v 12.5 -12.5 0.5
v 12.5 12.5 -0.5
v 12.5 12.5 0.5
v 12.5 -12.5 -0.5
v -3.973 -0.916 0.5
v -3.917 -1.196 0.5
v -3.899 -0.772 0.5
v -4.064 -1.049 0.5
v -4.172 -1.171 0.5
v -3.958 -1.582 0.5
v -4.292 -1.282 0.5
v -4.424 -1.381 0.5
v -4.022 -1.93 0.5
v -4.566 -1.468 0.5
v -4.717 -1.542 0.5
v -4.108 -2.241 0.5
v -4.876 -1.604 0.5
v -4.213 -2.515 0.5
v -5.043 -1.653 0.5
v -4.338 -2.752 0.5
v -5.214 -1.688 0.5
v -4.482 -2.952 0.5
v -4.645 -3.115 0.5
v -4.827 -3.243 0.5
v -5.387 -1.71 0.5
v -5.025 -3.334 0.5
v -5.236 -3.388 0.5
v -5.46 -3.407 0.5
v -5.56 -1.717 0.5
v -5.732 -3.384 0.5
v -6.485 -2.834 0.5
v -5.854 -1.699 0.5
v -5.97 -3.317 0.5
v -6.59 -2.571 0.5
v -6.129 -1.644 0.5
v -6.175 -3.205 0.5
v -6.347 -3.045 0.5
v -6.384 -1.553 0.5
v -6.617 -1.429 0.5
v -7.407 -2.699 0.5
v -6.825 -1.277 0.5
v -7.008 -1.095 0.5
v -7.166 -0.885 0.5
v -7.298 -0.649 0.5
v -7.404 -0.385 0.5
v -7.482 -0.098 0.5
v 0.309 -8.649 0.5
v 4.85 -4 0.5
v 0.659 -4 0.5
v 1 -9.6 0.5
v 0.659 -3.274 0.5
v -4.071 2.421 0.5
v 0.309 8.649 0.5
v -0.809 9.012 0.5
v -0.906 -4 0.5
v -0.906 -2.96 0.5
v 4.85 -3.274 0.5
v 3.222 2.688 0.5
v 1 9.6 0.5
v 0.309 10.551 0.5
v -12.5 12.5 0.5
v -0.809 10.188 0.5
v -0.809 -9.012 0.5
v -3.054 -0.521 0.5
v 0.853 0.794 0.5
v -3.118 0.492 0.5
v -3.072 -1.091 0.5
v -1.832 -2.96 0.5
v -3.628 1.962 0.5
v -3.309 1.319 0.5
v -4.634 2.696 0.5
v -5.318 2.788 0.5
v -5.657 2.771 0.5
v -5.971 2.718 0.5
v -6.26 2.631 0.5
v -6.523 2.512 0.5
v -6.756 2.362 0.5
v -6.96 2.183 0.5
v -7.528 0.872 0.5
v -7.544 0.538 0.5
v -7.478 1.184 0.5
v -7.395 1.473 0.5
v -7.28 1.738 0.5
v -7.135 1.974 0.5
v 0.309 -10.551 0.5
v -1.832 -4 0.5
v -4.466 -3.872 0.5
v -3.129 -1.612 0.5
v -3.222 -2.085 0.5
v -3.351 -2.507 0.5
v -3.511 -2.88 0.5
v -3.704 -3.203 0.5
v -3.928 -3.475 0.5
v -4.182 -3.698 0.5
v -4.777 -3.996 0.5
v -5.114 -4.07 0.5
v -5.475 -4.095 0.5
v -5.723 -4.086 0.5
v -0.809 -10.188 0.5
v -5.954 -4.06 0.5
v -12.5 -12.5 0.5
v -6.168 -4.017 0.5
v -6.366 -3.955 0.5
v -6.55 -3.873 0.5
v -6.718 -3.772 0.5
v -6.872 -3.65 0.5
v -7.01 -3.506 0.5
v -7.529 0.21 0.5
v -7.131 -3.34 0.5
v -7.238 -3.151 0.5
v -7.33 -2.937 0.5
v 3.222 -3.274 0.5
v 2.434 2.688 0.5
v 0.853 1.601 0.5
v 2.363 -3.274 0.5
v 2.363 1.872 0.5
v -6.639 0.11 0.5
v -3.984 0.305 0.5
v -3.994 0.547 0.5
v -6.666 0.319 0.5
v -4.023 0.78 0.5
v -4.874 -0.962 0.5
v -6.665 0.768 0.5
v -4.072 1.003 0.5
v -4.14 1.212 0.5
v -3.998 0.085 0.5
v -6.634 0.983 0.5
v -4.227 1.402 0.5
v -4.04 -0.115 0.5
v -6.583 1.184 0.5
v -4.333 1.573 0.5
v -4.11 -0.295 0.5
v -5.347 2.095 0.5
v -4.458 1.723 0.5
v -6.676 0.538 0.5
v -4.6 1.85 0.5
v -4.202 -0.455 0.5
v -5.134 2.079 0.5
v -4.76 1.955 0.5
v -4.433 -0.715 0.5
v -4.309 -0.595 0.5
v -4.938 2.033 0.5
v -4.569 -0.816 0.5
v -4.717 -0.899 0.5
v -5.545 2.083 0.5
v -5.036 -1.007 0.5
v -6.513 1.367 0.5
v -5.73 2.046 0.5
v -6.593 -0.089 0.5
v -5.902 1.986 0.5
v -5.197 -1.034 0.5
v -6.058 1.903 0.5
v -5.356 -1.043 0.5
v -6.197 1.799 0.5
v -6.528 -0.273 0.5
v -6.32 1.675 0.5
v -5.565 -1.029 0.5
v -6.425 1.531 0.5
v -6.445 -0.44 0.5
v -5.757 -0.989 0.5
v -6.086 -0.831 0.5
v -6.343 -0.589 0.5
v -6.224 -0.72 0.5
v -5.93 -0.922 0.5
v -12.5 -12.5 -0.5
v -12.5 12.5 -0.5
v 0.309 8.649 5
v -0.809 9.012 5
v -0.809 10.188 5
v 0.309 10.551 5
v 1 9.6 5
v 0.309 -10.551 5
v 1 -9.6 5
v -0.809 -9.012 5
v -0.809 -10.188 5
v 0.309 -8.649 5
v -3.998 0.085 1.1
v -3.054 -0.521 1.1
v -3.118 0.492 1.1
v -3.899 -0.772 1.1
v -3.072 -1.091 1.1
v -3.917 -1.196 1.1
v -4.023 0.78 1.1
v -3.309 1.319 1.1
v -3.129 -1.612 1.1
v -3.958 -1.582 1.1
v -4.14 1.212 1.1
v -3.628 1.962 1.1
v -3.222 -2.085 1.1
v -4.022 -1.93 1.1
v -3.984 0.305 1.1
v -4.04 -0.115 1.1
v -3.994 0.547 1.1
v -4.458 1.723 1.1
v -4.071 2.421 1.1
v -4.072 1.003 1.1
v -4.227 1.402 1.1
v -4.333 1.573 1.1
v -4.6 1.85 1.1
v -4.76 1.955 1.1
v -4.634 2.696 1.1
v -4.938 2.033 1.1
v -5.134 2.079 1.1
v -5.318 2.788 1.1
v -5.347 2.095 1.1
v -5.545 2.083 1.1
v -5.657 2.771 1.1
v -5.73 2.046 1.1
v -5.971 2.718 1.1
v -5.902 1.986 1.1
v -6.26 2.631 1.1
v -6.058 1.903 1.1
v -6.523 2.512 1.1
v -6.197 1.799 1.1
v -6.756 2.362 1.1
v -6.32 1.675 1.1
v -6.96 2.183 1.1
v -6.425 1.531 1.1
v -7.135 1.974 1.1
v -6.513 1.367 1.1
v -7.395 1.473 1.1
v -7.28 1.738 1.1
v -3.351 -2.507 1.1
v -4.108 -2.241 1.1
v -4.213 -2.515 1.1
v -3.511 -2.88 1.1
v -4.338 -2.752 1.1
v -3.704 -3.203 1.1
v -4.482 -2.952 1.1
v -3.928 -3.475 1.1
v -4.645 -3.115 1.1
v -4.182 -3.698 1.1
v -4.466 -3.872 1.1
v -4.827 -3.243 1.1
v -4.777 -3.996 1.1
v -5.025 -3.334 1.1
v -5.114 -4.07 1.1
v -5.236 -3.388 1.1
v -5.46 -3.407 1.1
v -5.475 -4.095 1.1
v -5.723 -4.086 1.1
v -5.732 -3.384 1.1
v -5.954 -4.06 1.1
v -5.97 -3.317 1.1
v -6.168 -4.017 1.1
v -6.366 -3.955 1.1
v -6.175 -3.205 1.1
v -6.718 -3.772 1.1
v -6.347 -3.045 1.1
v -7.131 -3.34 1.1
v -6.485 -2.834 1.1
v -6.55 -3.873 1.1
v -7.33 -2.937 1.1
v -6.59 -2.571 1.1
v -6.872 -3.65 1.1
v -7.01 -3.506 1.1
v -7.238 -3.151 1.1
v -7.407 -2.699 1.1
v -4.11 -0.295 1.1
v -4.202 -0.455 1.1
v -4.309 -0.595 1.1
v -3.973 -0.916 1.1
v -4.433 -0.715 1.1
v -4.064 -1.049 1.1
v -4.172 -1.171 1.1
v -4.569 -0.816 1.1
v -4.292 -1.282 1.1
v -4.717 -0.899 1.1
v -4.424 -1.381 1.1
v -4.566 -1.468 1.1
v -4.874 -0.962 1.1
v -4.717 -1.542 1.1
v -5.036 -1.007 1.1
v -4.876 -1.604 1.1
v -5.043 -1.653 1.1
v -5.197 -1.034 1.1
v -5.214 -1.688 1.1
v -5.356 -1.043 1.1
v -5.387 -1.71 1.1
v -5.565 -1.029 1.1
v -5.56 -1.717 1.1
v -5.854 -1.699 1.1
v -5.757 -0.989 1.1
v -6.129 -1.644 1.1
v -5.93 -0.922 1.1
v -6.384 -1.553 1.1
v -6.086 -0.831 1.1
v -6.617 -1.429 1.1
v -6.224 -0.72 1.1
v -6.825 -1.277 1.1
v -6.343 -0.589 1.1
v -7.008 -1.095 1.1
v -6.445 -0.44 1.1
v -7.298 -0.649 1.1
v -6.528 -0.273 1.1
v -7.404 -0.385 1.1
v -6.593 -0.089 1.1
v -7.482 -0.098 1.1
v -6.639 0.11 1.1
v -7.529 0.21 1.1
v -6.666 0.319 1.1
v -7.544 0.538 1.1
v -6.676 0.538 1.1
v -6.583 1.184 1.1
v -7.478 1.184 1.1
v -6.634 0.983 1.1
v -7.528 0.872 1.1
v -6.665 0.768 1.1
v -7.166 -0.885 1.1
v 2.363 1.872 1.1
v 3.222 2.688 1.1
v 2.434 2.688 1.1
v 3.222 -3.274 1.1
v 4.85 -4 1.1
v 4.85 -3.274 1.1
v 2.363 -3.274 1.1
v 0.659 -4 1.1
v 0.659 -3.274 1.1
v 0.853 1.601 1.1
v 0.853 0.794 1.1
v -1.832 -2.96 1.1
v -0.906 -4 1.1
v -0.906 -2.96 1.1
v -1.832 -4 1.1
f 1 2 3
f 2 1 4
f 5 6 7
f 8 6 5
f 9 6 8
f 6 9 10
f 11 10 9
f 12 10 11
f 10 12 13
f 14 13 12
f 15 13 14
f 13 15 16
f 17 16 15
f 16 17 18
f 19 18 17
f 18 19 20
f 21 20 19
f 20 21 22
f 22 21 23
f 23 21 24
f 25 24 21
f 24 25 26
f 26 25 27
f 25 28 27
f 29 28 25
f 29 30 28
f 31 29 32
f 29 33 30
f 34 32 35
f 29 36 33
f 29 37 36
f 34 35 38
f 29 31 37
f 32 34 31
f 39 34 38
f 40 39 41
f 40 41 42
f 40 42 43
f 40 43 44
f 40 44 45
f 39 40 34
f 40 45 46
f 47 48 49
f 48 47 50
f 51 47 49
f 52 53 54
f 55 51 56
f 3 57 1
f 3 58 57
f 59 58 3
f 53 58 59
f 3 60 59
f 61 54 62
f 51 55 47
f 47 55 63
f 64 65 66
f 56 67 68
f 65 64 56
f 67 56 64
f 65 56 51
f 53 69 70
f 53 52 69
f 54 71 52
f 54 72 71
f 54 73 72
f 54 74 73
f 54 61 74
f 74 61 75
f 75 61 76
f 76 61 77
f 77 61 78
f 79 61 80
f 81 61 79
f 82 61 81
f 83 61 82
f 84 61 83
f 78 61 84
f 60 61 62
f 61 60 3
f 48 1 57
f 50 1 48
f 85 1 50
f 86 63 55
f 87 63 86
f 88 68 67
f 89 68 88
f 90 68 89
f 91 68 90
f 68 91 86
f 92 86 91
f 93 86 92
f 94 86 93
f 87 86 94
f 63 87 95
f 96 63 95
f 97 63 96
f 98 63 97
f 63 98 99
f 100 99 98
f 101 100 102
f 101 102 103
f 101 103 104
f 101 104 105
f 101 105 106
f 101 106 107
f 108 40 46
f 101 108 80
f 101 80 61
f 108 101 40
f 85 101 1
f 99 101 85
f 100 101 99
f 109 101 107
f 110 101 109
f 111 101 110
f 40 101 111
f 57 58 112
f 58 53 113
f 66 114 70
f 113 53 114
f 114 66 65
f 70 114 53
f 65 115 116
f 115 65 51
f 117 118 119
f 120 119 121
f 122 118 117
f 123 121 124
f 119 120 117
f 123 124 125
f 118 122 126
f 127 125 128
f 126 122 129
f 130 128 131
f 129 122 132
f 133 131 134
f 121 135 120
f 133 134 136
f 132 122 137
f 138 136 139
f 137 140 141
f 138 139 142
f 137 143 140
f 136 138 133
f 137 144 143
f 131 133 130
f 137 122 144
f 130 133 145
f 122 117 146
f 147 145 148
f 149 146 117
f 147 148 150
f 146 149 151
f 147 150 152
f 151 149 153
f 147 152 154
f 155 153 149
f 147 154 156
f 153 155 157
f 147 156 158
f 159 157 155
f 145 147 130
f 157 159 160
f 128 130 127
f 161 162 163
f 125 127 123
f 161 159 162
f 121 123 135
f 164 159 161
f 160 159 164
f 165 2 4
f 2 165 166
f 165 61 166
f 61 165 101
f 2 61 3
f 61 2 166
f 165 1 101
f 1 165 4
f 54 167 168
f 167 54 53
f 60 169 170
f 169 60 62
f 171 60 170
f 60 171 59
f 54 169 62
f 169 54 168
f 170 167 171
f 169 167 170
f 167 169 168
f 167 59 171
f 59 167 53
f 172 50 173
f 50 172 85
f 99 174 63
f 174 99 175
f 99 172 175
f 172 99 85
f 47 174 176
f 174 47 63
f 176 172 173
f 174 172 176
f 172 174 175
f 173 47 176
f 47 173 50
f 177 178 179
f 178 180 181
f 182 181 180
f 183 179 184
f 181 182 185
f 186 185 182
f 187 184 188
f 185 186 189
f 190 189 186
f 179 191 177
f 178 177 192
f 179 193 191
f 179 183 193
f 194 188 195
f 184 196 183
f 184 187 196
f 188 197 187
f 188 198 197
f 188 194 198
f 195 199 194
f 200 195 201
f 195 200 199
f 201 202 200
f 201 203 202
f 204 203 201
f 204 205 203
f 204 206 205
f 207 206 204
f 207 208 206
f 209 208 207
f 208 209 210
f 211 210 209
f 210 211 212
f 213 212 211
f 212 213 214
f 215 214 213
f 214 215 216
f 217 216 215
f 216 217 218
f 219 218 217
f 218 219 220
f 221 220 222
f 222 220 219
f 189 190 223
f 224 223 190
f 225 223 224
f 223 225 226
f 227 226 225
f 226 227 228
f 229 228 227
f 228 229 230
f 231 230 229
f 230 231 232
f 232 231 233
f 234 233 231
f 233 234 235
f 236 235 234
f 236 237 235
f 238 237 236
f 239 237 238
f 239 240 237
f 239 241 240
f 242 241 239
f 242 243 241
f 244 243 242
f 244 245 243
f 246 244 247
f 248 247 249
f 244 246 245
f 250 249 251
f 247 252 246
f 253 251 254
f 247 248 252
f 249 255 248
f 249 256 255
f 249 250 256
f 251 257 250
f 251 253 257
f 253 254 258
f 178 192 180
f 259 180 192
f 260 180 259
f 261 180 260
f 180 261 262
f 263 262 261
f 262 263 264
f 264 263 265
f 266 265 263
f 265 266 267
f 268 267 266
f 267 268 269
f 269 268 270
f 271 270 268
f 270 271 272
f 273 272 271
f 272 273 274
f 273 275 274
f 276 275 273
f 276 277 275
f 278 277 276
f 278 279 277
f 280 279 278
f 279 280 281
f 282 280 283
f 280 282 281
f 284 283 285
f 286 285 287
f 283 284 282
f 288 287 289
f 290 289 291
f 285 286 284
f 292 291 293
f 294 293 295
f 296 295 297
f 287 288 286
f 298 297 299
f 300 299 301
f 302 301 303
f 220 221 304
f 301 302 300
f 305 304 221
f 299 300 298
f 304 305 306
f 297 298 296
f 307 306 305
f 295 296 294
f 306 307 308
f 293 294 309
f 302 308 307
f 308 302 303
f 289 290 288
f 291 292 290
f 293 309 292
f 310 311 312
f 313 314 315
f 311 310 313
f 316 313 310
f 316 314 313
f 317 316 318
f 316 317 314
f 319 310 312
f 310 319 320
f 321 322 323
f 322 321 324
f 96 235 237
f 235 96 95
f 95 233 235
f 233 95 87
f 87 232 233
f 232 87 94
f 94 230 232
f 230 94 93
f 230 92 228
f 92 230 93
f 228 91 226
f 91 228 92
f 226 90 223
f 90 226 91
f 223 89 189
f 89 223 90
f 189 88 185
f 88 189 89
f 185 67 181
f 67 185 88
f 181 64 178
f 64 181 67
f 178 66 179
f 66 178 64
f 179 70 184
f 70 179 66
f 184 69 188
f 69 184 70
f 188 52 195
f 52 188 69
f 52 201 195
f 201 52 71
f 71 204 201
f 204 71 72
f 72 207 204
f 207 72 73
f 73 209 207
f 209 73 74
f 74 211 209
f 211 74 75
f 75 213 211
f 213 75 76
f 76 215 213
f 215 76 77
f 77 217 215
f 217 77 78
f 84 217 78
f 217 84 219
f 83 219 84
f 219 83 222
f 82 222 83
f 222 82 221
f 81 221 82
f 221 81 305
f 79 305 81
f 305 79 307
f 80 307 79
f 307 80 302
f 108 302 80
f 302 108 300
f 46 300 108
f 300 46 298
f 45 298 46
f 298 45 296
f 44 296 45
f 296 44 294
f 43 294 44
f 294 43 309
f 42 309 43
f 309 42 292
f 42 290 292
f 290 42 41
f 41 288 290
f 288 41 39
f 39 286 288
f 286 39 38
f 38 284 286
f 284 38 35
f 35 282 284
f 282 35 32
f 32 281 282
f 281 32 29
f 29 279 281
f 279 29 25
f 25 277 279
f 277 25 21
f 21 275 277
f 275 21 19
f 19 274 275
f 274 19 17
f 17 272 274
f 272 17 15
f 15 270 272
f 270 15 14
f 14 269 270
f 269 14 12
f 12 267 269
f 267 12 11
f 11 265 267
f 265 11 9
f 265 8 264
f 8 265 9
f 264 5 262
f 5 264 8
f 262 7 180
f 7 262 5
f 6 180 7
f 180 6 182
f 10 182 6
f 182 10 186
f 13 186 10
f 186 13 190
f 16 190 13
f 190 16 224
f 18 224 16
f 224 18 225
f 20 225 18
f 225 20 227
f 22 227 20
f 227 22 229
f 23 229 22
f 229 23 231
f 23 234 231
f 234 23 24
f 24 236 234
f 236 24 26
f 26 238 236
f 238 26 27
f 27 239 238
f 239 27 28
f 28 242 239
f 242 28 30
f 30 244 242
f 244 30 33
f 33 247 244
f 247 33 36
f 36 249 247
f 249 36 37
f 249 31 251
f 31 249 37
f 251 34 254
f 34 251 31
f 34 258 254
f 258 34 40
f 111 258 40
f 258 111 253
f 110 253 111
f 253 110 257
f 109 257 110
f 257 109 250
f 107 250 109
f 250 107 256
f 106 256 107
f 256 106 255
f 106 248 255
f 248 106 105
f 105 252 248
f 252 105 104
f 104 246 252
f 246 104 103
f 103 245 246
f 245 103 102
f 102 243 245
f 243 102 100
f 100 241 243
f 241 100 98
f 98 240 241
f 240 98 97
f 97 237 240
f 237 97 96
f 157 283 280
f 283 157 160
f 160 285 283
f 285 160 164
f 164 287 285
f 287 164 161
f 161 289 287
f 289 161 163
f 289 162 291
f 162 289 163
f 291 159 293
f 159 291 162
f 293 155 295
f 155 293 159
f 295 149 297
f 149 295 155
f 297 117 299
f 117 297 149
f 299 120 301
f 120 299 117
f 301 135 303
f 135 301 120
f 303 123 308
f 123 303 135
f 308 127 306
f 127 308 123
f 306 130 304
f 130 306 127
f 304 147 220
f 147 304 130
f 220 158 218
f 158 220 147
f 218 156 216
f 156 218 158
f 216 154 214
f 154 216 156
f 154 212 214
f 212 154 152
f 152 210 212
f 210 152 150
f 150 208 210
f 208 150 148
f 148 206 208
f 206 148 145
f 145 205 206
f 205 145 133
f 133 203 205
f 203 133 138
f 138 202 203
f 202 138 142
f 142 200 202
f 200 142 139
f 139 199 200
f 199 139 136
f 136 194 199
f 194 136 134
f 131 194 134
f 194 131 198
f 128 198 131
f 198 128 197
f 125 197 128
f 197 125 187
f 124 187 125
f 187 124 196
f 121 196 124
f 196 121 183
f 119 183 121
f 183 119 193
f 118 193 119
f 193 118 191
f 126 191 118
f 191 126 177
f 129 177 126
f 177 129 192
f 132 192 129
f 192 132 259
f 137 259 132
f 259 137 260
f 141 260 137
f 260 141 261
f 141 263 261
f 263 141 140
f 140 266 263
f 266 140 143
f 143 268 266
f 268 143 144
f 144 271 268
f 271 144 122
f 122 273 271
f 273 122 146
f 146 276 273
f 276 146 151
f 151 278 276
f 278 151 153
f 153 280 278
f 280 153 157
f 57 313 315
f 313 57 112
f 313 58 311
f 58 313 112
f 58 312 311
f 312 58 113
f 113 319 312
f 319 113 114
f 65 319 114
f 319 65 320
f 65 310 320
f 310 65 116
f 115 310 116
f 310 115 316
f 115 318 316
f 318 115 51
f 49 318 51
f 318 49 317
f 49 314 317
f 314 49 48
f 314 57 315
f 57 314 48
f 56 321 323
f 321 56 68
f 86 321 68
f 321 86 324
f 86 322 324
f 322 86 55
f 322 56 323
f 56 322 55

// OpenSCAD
rozmer_drzaku_x=96;rozmer_drzaku_y=96;

//lista_drzaku();
jedna_pozice_stojanku_s_pinem();

/*
difference(){
// testovani profilu supliku - vygeneruje jenom uzky profil a ne cely vec
translate([0,0,46])
    rotate([0,90,0])
        drzak_suplik();

translate([0,0,32]) cube([96,96,96], center=true);

}
*/

module drzak_suplik(){

    //translate([0,0,0.1])
    drzak_samotny();

    translate([0,-1*rozmer_drzaku_y*0.5,-1.5])
        rotate([0,90,180])
            lista_drzaku();

    translate([0,rozmer_drzaku_x*0.5,-1.5])
        rotate([0,90,0])
            lista_drzaku();

    translate([-1*rozmer_drzaku_x*0.5,0,-1.5])
        rotate([0,90,90])
            lista_drzaku();
}

module lista_drzaku(){

    translate([0,-6,0])
    difference(){
        difference(){
            color("pink", 0.9)
                linear_extrude(height = rozmer_drzaku_x, center = true, convexity = 10, twist = 0)
                    square(6);
                
            color("dimgrey", 0.6)
                linear_extrude(height = rozmer_drzaku_x, center = true, convexity = 10, twist = 0)
                    square(4); //nebo 4.5
            }
            

    color("red", 0.8)
        translate([4,0,0])
            linear_extrude(height = rozmer_drzaku_x, center = true, convexity = 10, twist = 0)
                square(0);
        }
}


module drzak_samotny(){
    color("grey", 0.5)
        cube([rozmer_drzaku_x,rozmer_drzaku_y,3], center=true);
    
}

//jedna_pozice_stojanku();


module jedna_pozice_stojanku_s_pinem(){
    vyska_stojanku = 5;
    sirka_stojanku = 1;
    polomer_stojanku = 9.1;
    
    offset_pinu_od_stredu = polomer_stojanku+sirka_stojanku;

    color("cyan", alpha=0.5)
        cube([25,25,1], center=true);
    
    color("blue")
        translate([0,0.5*sirka_stojanku+polomer_stojanku,vyska_stojanku/2])
            cylinder(h=vyska_stojanku, r=sirka_stojanku, center=true);
    
    mirror([0,1,0])
        color("red")
        translate([0,0.5*sirka_stojanku+polomer_stojanku,vyska_stojanku/2])
            cylinder(h=vyska_stojanku, r=sirka_stojanku, center=true);
    
    color("black")    
        translate([-8,-4,0.1])
            linear_extrude(1)
                text(text=str(polomer_stojanku), size=7);
          

}
module jedna_pozice_stojanku(){

    vyska_stojanku = 5;
    sirka_stojanku = 2;
    polomer_stojanku = 9.1;

    difference(){
    color("cyan", alpha=0.5)
        cube([25,25,1], center=true);
    
    color("white")    
        translate([-8,-4,-0.0])
        linear_extrude(1)
                text(text=str(polomer_stojanku), size=7);
    }      
    
        
    rotate(a=[0,0,30])
        color("red")
            rotate_extrude(angle=90)
                translate([polomer_stojanku, 0])
                    square([sirka_stojanku,vyska_stojanku]);
       

    mirror([0,1,0])
        rotate(a=[0,0,60])
            color("green")
                rotate_extrude(angle=90)
                    translate([polomer_stojanku, 0])
                        square([sirka_stojanku,vyska_stojanku]);
}

/*
color("cyan")
    translate([40, 0, 0])
        rotate_extrude($fn = 80)
            text("  J");

*/
